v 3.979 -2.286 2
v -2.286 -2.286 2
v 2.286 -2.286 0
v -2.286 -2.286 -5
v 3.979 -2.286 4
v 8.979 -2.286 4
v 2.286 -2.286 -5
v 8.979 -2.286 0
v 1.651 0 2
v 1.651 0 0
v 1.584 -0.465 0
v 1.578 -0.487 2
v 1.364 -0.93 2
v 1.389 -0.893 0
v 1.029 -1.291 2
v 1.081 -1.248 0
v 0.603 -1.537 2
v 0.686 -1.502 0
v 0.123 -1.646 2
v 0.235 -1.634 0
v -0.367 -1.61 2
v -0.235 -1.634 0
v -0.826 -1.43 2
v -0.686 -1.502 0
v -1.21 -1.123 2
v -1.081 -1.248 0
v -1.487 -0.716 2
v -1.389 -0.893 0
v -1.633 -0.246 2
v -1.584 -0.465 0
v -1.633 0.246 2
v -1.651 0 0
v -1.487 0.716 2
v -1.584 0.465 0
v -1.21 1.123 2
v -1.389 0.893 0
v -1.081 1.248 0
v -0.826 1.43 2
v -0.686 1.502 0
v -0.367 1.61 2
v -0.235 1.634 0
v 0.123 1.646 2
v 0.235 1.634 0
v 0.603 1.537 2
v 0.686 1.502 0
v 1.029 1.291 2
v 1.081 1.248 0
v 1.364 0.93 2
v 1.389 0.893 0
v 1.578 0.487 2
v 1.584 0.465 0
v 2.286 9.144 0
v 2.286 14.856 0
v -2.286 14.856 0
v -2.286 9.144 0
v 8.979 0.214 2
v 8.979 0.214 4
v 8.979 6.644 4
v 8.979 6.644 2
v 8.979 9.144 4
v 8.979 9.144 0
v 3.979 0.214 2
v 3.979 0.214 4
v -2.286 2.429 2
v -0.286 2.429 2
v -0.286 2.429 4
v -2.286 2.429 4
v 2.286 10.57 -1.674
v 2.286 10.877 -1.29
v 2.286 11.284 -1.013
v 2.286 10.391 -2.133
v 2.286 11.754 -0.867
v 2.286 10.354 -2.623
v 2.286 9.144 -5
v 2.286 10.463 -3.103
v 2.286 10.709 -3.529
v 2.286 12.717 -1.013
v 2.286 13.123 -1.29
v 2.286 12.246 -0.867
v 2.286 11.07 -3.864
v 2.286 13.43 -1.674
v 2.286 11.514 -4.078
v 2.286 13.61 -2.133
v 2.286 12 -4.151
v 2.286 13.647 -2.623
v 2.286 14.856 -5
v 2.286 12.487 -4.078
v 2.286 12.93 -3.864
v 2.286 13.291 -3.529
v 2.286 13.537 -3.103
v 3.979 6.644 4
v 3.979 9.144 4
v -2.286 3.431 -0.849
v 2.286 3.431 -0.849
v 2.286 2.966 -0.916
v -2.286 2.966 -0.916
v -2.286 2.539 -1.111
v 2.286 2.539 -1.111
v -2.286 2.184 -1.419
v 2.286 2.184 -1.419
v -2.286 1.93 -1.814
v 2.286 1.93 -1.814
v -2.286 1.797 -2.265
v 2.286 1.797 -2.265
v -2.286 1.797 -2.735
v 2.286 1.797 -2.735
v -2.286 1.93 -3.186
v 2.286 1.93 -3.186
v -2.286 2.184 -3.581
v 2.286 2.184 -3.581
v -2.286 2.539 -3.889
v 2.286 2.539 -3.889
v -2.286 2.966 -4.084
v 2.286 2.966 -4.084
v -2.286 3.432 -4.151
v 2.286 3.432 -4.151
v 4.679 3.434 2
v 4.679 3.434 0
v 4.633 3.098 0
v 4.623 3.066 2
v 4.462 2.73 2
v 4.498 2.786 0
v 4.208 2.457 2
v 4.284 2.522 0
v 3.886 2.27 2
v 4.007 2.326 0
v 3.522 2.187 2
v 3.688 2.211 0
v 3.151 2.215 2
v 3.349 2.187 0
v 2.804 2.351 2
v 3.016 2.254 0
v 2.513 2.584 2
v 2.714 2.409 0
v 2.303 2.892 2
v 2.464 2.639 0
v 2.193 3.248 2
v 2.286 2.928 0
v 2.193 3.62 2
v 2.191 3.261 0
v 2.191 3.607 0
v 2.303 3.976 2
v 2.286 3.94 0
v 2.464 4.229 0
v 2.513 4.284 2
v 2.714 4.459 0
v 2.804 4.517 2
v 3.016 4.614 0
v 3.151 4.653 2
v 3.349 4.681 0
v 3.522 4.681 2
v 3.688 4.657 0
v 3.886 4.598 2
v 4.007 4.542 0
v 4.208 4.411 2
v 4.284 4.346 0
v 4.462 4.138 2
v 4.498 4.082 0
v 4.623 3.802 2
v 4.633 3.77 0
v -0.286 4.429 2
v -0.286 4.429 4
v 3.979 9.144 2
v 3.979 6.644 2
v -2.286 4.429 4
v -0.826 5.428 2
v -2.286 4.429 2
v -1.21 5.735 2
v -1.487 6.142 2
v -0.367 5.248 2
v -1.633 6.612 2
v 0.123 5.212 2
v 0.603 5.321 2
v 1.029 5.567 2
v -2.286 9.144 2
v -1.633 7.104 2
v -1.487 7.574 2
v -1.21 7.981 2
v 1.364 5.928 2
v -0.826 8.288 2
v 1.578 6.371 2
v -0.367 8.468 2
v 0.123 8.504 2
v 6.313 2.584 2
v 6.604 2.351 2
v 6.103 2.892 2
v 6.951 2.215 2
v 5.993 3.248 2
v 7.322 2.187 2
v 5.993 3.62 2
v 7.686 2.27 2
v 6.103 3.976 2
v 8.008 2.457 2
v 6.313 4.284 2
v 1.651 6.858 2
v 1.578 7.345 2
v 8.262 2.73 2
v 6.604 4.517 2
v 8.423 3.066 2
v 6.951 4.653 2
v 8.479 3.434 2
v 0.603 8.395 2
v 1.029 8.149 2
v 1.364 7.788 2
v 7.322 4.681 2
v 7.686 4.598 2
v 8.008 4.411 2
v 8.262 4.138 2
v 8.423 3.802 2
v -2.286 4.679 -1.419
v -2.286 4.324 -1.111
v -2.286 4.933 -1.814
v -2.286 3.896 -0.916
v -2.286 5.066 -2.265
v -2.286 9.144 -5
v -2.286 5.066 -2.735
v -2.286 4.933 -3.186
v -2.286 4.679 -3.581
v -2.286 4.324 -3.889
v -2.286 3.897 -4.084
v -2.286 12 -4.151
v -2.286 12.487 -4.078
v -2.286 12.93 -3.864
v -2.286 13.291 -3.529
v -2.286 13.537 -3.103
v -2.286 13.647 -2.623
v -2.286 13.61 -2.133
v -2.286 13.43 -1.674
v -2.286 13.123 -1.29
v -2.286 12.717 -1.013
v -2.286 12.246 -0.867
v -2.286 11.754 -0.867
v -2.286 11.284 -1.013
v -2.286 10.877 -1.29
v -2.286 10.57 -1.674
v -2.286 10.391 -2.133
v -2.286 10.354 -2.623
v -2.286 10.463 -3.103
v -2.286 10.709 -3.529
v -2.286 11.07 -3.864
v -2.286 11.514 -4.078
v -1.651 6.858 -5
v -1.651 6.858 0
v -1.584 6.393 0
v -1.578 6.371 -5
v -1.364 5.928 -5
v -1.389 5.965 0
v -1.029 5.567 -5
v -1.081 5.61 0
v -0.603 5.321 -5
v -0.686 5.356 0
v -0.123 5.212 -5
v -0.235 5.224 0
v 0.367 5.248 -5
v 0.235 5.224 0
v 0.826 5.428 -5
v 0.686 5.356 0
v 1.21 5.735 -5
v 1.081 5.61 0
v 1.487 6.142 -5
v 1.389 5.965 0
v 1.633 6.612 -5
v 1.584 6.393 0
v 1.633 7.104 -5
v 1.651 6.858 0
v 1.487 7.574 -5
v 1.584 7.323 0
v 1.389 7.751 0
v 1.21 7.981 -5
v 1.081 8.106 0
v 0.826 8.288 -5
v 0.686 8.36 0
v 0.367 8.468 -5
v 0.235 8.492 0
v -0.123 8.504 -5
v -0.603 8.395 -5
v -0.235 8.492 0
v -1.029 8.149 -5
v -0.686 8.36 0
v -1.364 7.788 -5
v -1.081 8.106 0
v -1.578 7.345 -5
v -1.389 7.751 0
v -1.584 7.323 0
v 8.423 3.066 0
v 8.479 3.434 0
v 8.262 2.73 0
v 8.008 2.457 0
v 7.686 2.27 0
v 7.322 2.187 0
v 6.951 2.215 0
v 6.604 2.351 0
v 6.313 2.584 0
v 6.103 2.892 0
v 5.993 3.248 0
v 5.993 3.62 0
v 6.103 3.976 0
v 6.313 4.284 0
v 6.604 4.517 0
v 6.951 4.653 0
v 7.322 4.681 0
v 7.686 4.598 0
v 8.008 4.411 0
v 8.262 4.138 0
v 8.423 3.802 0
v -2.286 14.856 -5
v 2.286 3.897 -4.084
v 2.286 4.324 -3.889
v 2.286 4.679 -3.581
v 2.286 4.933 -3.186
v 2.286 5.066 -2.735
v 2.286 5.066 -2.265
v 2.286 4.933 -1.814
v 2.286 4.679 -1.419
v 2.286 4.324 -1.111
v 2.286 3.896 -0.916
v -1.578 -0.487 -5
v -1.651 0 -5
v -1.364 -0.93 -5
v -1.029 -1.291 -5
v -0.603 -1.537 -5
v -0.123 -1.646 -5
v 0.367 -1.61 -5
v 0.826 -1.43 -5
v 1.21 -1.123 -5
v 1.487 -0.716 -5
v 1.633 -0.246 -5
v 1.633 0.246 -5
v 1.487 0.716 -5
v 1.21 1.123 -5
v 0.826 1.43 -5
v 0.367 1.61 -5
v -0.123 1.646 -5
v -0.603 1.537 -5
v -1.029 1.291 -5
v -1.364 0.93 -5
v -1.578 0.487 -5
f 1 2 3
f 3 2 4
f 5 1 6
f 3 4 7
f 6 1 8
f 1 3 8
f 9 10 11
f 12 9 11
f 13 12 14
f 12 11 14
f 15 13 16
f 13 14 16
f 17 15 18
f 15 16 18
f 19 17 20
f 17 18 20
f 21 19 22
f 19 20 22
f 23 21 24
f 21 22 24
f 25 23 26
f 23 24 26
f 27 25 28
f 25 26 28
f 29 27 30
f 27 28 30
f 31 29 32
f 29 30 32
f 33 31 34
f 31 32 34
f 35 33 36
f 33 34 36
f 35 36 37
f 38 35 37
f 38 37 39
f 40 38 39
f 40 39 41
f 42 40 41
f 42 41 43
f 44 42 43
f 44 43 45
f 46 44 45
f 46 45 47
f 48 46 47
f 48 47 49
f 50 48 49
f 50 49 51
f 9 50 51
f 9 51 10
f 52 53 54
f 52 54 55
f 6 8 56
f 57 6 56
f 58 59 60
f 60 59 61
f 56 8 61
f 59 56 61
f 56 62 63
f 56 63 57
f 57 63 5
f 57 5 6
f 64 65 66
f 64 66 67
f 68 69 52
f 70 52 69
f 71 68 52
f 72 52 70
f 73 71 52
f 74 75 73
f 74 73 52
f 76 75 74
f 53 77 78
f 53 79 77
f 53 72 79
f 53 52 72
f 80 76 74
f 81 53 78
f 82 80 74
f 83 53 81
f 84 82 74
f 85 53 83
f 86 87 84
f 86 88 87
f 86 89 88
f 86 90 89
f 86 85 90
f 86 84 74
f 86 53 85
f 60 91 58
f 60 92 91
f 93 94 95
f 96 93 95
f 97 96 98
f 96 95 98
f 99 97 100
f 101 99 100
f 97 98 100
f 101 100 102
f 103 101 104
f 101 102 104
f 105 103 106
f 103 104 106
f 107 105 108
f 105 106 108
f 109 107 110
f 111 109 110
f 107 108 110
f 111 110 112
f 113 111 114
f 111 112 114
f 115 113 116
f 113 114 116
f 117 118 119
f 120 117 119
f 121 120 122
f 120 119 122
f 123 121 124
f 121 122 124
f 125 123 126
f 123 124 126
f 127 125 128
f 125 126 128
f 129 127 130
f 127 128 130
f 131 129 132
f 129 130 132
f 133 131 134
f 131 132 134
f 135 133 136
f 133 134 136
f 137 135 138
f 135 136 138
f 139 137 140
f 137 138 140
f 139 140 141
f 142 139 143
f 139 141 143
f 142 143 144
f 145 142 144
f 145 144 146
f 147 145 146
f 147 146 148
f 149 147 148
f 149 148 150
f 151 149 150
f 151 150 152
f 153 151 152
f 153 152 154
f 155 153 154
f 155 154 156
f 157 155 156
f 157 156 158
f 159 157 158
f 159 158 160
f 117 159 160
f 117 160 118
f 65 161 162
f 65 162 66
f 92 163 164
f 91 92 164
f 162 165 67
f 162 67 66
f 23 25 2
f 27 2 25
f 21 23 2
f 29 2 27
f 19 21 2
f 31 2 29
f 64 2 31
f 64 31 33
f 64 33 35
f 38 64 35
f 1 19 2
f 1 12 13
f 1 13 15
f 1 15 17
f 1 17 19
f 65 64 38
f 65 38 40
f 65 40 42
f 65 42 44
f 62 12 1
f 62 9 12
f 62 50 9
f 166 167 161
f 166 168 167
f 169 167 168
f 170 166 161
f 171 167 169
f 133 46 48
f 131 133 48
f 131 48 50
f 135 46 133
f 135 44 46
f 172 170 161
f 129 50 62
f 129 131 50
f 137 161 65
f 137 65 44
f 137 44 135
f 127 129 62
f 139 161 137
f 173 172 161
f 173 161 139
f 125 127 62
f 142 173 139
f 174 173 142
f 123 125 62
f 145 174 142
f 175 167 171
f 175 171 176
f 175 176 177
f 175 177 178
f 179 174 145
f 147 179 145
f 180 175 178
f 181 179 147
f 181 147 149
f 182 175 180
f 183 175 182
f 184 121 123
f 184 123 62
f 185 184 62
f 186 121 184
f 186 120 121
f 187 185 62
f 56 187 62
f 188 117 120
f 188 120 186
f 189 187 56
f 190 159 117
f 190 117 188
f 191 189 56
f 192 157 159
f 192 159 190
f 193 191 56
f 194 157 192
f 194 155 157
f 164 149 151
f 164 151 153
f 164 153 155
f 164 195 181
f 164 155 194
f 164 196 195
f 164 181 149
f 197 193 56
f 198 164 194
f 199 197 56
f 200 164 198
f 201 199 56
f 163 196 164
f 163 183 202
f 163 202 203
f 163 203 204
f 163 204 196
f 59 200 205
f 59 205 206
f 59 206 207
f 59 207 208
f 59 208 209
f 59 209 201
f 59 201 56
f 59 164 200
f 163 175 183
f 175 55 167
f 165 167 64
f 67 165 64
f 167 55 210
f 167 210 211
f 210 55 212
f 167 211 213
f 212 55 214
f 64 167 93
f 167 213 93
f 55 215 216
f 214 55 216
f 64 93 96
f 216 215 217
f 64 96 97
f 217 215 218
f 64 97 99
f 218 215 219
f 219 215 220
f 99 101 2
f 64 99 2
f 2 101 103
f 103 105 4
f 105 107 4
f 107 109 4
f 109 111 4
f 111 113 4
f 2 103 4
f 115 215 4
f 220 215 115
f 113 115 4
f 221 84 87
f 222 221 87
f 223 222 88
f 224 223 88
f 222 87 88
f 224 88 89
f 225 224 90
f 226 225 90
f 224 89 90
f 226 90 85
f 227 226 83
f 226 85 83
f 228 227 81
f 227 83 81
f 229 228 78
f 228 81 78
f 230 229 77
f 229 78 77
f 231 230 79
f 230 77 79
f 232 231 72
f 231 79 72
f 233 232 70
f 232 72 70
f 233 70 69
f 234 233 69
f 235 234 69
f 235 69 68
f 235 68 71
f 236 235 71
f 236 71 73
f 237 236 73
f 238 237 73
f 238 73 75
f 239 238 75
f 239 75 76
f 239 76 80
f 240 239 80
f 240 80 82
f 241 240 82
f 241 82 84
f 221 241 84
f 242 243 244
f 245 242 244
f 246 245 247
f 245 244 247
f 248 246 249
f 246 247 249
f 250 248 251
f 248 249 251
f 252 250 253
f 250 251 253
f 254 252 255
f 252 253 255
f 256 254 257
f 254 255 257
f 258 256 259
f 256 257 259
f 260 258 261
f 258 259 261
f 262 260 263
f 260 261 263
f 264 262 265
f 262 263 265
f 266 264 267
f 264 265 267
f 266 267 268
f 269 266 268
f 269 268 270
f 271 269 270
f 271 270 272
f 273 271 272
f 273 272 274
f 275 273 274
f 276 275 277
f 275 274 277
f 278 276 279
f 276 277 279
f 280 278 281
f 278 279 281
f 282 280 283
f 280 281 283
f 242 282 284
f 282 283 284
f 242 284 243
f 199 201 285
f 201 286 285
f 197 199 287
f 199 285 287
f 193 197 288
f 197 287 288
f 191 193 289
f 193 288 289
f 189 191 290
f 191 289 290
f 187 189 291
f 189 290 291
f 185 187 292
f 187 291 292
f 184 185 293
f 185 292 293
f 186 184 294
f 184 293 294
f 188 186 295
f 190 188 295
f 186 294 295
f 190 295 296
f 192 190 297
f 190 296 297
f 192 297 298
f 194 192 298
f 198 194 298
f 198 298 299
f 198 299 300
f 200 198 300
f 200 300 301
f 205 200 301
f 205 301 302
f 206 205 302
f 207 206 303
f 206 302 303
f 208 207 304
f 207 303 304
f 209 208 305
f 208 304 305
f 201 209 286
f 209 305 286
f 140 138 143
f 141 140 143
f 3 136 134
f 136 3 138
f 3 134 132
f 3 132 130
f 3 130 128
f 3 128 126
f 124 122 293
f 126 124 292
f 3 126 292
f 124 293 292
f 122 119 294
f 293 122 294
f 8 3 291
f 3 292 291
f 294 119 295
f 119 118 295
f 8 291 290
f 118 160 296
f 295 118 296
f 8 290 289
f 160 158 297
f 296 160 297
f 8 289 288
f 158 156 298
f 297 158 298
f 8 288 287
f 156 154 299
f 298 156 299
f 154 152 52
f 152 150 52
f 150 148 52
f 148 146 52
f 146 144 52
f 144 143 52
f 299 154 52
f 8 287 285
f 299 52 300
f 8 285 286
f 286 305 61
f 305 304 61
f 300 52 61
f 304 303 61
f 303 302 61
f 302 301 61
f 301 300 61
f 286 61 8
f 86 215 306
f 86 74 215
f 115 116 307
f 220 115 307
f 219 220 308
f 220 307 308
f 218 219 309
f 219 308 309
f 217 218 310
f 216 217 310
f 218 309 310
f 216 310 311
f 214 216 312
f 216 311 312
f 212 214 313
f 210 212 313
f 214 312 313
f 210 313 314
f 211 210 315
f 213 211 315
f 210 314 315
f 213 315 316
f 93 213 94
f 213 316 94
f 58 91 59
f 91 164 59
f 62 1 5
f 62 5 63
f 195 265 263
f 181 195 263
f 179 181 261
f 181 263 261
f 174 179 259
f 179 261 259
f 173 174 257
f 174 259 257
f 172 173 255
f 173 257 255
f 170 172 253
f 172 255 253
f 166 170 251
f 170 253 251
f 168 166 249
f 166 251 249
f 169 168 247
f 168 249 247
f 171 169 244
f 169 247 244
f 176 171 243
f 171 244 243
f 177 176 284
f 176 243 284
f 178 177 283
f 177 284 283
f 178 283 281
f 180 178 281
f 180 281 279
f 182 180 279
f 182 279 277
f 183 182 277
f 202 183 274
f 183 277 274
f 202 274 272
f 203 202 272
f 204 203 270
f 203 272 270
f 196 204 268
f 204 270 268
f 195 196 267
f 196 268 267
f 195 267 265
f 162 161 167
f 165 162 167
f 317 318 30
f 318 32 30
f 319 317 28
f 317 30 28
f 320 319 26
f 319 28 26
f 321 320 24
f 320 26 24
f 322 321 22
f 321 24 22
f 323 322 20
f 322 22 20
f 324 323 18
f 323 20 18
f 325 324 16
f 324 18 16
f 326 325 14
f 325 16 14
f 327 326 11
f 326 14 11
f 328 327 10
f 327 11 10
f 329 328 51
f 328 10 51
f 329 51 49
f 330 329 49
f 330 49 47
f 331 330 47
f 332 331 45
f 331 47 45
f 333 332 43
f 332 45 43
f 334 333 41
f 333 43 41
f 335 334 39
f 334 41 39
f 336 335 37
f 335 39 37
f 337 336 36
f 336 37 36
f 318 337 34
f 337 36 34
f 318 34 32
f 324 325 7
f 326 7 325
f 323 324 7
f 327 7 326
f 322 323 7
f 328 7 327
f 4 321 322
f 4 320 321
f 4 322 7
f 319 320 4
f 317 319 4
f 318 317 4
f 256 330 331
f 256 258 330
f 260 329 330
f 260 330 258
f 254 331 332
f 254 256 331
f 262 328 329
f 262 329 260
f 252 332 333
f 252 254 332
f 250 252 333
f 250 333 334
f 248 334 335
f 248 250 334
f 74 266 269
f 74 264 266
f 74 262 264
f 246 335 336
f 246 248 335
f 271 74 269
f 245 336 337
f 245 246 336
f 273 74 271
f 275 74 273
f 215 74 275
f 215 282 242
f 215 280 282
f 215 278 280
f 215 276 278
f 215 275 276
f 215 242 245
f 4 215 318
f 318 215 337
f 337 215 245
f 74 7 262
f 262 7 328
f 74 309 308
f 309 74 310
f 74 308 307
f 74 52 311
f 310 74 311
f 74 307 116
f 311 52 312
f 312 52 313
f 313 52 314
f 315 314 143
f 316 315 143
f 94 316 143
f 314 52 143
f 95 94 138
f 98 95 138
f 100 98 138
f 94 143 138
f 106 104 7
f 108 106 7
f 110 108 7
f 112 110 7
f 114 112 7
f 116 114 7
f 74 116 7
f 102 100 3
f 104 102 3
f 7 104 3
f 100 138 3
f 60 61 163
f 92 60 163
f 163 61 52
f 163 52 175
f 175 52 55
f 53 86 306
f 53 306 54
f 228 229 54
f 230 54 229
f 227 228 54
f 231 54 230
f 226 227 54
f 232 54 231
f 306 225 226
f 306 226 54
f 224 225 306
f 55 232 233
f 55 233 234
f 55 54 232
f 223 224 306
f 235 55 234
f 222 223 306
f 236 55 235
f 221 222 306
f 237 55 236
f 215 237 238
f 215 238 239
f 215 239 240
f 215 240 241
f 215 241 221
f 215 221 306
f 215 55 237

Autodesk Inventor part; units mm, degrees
ref_plane "YZ Plane" through (0, 0, 0) normal (1, 0, 0) x (0, 1, 0)
ref_plane "XZ Plane" through (0, 0, 0) normal (0, 1, 0) x (-1, 0, 0)
ref_plane "XY Plane" through (0, 0, 0) normal (0, 0, 1) x (1, 0, 0)
sketch "Sketch21" plane through (0, 0, 0) normal (0, 0, 1) x (1, 0, 0)
  line L0 (0, 0) -> (0, 6.858)
  line L1 (0, 6.858) -> (3.429, 6.858)
  line L2 (3.429, 6.858) -> (3.429, 3.434)
  line L3 (3.429, 3.434) -> (7.229, 3.434)
  circle A0 centre (0, 0) radius 1.651
  circle A1 centre (0, 6.858) radius 1.651
  circle A2 centre (3.429, 3.434) radius 1.25
  circle A3 centre (7.229, 3.434) radius 1.25
  line L4 (7.229, 3.434) -> (8.979, 3.434)
  line L5 (8.979, 9.144) -> (-2.286, 9.144)
  line L6 (-2.286, 9.144) -> (-2.286, -2.286)
  line L7 (-2.286, -2.286) -> (8.979, -2.286)
  line L8 (8.979, -2.286) -> (8.979, 9.144)
  dimension "d76" = 6.858
  dimension "d77" = 3.429
  dimension "d78" = 3.424
  dimension "d79" = 3.8
  dimension "d80" = 3.302
  dimension "d81" = 3.302
  dimension "d82" = 2.5
  dimension "d83" = 2.5
  dimension "d84" = 1.75
extrude "Extrusion19" add sketch "Sketch21" along normal blind 2
sketch "Sketch22" plane through (0, 0, 2) normal (0, 0, 1) x (1, 0, 0)
  line L0 (-2.286, -2.286) -> (8.979, -2.286) projected
  line L1 (8.979, -2.286) -> (3.979, -2.286)
  line L2 (3.979, -2.286) -> (3.979, 0.214)
  line L3 (3.979, 0.214) -> (8.979, 0.214)
  line L4 (8.979, 0.214) -> (8.979, -2.286)
  line L5 (8.979, 9.144) -> (-2.286, 9.144) projected
  line L6 (8.979, 9.144) -> (3.979, 9.144)
  line L7 (3.979, 9.144) -> (3.979, 6.644)
  line L8 (3.979, 6.644) -> (8.979, 6.644)
  line L9 (8.979, 6.644) -> (8.979, 9.144)
  line L10 (-2.286, 9.144) -> (-2.286, -2.286) projected
  line L11 (-2.286, 3.429) -> (-1.286, 3.429)
  line L12 (-1.286, 3.429) -> (-1.286, 4.429)
  line L13 (-1.286, 4.429) -> (-2.286, 4.429)
  line L14 (-2.286, 4.429) -> (-2.286, 3.429)
  line L15 (-2.286, 4.429) -> (-0.286, 4.429)
  line L16 (-0.286, 4.429) -> (-0.286, 2.429)
  line L17 (-0.286, 2.429) -> (-2.286, 2.429)
  line L18 (-2.286, 2.429) -> (-2.286, 4.429)
  point P0 (0, 0)
  dimension "d89" = 5
  dimension "d90" = 2.5
  dimension "d91" = 5
  dimension "d92" = 2.5
  dimension "d93" = 1
  dimension "d94" = 1
  dimension "d95" = 2
  dimension "d96" = 2
extrude "Extrusion20" add sketch "Sketch22" along normal blind 2
sketch "Sketch23" plane through (0, 0, 0) normal (0, 0, -1) x (-1, 0, 0)
  circle A0 centre (0, 6.858) radius 1.651 projected
  circle A1 centre (0, 6.858) radius 2.286
  line L0 (2.286, 9.144) -> (2.286, -2.286) projected
  line L1 (-2.286, 6.858) -> (-2.286, -2.286)
  line L2 (-8.979, 9.144) -> (2.286, 9.144) projected
  line L3 (-2.286, -2.286) -> (2.286, -2.286)
  line L4 (2.286, -2.286) -> (2.286, 9.144)
  line L5 (2.286, 9.144) -> (-2.286, 9.144)
  line L6 (-2.286, 9.144) -> (-2.286, -2.286)
  circle A2 centre (0, 0) radius 1.651
extrude "Extrusion21" add sketch "Sketch23" along normal blind 5
sketch "Sketch24" plane through (2.286, 2.928, 0) normal (1, 0, 0) x (0, 0, -1)
  line L0 (5, -5.214) -> (5, 6.216) projected
  line L1 (5, 6.216) -> (-2, 6.216) projected
  line L2 (5, -5.214) -> (5, 6.216)
  line L3 (5, 0.501) -> (-9.7149, 0.501)
  line L4 (0, 1.012) -> (0, 0) projected
  line L5 (0, 0.506) -> (5, 0.501)
  circle A0 centre (2.5, 0.5035) radius 1.651
  point P0 (0, -2.928)
  dimension "d101" = 3.302
extrude "Extrusion22" cut sketch "Sketch24" against normal blind 5 contours A0 L3 | L3 A0
sketch "Sketch25" plane through (2.286, 2.928, 0) normal (1, 0, 0) x (0, 0, -1)
  circle A0 centre (2.5, 0.5035) radius 1.651 projected
  line L0 (5, 6.216) -> (-2, 6.216) projected
  line L1 (5, -5.214) -> (5, 6.216) projected
  circle A1 centre (2.5, 9.0723) radius 1.651
  line L2 (5, 11.9285) -> (0, 11.9285)
  line L3 (0, 11.9285) -> (0, 6.216)
  line L4 (0, 6.216) -> (5, 6.216)
  line L5 (5, 6.216) -> (5, 11.9285)
  point P0 (0, -2.928)
  dimension "d105" = 3.302
extrude "Extrusion23" add sketch "Sketch25" against normal blind 5 contours L0 L3 L2 L5
sketch "Sketch26" plane through (-2.714, 9.144, 0) normal (0, -1, 0) x (1, 0, 0)
  line L0 (0.428, 0) -> (0, 0) projected
  line L1 (5, -5) -> (0.428, -5) projected
  line L2 (0, 0) -> (0.428, 0)
  line L3 (0.428, 0) -> (0.428, -5)
  line L4 (0.428, -5) -> (0, -5)
  line L5 (0, -5) -> (0, 0)
  point P0 (2.714, 0)
extrude "Extrusion24" cut sketch "Sketch26" against normal blind 50
properties part number "SensorMount"
